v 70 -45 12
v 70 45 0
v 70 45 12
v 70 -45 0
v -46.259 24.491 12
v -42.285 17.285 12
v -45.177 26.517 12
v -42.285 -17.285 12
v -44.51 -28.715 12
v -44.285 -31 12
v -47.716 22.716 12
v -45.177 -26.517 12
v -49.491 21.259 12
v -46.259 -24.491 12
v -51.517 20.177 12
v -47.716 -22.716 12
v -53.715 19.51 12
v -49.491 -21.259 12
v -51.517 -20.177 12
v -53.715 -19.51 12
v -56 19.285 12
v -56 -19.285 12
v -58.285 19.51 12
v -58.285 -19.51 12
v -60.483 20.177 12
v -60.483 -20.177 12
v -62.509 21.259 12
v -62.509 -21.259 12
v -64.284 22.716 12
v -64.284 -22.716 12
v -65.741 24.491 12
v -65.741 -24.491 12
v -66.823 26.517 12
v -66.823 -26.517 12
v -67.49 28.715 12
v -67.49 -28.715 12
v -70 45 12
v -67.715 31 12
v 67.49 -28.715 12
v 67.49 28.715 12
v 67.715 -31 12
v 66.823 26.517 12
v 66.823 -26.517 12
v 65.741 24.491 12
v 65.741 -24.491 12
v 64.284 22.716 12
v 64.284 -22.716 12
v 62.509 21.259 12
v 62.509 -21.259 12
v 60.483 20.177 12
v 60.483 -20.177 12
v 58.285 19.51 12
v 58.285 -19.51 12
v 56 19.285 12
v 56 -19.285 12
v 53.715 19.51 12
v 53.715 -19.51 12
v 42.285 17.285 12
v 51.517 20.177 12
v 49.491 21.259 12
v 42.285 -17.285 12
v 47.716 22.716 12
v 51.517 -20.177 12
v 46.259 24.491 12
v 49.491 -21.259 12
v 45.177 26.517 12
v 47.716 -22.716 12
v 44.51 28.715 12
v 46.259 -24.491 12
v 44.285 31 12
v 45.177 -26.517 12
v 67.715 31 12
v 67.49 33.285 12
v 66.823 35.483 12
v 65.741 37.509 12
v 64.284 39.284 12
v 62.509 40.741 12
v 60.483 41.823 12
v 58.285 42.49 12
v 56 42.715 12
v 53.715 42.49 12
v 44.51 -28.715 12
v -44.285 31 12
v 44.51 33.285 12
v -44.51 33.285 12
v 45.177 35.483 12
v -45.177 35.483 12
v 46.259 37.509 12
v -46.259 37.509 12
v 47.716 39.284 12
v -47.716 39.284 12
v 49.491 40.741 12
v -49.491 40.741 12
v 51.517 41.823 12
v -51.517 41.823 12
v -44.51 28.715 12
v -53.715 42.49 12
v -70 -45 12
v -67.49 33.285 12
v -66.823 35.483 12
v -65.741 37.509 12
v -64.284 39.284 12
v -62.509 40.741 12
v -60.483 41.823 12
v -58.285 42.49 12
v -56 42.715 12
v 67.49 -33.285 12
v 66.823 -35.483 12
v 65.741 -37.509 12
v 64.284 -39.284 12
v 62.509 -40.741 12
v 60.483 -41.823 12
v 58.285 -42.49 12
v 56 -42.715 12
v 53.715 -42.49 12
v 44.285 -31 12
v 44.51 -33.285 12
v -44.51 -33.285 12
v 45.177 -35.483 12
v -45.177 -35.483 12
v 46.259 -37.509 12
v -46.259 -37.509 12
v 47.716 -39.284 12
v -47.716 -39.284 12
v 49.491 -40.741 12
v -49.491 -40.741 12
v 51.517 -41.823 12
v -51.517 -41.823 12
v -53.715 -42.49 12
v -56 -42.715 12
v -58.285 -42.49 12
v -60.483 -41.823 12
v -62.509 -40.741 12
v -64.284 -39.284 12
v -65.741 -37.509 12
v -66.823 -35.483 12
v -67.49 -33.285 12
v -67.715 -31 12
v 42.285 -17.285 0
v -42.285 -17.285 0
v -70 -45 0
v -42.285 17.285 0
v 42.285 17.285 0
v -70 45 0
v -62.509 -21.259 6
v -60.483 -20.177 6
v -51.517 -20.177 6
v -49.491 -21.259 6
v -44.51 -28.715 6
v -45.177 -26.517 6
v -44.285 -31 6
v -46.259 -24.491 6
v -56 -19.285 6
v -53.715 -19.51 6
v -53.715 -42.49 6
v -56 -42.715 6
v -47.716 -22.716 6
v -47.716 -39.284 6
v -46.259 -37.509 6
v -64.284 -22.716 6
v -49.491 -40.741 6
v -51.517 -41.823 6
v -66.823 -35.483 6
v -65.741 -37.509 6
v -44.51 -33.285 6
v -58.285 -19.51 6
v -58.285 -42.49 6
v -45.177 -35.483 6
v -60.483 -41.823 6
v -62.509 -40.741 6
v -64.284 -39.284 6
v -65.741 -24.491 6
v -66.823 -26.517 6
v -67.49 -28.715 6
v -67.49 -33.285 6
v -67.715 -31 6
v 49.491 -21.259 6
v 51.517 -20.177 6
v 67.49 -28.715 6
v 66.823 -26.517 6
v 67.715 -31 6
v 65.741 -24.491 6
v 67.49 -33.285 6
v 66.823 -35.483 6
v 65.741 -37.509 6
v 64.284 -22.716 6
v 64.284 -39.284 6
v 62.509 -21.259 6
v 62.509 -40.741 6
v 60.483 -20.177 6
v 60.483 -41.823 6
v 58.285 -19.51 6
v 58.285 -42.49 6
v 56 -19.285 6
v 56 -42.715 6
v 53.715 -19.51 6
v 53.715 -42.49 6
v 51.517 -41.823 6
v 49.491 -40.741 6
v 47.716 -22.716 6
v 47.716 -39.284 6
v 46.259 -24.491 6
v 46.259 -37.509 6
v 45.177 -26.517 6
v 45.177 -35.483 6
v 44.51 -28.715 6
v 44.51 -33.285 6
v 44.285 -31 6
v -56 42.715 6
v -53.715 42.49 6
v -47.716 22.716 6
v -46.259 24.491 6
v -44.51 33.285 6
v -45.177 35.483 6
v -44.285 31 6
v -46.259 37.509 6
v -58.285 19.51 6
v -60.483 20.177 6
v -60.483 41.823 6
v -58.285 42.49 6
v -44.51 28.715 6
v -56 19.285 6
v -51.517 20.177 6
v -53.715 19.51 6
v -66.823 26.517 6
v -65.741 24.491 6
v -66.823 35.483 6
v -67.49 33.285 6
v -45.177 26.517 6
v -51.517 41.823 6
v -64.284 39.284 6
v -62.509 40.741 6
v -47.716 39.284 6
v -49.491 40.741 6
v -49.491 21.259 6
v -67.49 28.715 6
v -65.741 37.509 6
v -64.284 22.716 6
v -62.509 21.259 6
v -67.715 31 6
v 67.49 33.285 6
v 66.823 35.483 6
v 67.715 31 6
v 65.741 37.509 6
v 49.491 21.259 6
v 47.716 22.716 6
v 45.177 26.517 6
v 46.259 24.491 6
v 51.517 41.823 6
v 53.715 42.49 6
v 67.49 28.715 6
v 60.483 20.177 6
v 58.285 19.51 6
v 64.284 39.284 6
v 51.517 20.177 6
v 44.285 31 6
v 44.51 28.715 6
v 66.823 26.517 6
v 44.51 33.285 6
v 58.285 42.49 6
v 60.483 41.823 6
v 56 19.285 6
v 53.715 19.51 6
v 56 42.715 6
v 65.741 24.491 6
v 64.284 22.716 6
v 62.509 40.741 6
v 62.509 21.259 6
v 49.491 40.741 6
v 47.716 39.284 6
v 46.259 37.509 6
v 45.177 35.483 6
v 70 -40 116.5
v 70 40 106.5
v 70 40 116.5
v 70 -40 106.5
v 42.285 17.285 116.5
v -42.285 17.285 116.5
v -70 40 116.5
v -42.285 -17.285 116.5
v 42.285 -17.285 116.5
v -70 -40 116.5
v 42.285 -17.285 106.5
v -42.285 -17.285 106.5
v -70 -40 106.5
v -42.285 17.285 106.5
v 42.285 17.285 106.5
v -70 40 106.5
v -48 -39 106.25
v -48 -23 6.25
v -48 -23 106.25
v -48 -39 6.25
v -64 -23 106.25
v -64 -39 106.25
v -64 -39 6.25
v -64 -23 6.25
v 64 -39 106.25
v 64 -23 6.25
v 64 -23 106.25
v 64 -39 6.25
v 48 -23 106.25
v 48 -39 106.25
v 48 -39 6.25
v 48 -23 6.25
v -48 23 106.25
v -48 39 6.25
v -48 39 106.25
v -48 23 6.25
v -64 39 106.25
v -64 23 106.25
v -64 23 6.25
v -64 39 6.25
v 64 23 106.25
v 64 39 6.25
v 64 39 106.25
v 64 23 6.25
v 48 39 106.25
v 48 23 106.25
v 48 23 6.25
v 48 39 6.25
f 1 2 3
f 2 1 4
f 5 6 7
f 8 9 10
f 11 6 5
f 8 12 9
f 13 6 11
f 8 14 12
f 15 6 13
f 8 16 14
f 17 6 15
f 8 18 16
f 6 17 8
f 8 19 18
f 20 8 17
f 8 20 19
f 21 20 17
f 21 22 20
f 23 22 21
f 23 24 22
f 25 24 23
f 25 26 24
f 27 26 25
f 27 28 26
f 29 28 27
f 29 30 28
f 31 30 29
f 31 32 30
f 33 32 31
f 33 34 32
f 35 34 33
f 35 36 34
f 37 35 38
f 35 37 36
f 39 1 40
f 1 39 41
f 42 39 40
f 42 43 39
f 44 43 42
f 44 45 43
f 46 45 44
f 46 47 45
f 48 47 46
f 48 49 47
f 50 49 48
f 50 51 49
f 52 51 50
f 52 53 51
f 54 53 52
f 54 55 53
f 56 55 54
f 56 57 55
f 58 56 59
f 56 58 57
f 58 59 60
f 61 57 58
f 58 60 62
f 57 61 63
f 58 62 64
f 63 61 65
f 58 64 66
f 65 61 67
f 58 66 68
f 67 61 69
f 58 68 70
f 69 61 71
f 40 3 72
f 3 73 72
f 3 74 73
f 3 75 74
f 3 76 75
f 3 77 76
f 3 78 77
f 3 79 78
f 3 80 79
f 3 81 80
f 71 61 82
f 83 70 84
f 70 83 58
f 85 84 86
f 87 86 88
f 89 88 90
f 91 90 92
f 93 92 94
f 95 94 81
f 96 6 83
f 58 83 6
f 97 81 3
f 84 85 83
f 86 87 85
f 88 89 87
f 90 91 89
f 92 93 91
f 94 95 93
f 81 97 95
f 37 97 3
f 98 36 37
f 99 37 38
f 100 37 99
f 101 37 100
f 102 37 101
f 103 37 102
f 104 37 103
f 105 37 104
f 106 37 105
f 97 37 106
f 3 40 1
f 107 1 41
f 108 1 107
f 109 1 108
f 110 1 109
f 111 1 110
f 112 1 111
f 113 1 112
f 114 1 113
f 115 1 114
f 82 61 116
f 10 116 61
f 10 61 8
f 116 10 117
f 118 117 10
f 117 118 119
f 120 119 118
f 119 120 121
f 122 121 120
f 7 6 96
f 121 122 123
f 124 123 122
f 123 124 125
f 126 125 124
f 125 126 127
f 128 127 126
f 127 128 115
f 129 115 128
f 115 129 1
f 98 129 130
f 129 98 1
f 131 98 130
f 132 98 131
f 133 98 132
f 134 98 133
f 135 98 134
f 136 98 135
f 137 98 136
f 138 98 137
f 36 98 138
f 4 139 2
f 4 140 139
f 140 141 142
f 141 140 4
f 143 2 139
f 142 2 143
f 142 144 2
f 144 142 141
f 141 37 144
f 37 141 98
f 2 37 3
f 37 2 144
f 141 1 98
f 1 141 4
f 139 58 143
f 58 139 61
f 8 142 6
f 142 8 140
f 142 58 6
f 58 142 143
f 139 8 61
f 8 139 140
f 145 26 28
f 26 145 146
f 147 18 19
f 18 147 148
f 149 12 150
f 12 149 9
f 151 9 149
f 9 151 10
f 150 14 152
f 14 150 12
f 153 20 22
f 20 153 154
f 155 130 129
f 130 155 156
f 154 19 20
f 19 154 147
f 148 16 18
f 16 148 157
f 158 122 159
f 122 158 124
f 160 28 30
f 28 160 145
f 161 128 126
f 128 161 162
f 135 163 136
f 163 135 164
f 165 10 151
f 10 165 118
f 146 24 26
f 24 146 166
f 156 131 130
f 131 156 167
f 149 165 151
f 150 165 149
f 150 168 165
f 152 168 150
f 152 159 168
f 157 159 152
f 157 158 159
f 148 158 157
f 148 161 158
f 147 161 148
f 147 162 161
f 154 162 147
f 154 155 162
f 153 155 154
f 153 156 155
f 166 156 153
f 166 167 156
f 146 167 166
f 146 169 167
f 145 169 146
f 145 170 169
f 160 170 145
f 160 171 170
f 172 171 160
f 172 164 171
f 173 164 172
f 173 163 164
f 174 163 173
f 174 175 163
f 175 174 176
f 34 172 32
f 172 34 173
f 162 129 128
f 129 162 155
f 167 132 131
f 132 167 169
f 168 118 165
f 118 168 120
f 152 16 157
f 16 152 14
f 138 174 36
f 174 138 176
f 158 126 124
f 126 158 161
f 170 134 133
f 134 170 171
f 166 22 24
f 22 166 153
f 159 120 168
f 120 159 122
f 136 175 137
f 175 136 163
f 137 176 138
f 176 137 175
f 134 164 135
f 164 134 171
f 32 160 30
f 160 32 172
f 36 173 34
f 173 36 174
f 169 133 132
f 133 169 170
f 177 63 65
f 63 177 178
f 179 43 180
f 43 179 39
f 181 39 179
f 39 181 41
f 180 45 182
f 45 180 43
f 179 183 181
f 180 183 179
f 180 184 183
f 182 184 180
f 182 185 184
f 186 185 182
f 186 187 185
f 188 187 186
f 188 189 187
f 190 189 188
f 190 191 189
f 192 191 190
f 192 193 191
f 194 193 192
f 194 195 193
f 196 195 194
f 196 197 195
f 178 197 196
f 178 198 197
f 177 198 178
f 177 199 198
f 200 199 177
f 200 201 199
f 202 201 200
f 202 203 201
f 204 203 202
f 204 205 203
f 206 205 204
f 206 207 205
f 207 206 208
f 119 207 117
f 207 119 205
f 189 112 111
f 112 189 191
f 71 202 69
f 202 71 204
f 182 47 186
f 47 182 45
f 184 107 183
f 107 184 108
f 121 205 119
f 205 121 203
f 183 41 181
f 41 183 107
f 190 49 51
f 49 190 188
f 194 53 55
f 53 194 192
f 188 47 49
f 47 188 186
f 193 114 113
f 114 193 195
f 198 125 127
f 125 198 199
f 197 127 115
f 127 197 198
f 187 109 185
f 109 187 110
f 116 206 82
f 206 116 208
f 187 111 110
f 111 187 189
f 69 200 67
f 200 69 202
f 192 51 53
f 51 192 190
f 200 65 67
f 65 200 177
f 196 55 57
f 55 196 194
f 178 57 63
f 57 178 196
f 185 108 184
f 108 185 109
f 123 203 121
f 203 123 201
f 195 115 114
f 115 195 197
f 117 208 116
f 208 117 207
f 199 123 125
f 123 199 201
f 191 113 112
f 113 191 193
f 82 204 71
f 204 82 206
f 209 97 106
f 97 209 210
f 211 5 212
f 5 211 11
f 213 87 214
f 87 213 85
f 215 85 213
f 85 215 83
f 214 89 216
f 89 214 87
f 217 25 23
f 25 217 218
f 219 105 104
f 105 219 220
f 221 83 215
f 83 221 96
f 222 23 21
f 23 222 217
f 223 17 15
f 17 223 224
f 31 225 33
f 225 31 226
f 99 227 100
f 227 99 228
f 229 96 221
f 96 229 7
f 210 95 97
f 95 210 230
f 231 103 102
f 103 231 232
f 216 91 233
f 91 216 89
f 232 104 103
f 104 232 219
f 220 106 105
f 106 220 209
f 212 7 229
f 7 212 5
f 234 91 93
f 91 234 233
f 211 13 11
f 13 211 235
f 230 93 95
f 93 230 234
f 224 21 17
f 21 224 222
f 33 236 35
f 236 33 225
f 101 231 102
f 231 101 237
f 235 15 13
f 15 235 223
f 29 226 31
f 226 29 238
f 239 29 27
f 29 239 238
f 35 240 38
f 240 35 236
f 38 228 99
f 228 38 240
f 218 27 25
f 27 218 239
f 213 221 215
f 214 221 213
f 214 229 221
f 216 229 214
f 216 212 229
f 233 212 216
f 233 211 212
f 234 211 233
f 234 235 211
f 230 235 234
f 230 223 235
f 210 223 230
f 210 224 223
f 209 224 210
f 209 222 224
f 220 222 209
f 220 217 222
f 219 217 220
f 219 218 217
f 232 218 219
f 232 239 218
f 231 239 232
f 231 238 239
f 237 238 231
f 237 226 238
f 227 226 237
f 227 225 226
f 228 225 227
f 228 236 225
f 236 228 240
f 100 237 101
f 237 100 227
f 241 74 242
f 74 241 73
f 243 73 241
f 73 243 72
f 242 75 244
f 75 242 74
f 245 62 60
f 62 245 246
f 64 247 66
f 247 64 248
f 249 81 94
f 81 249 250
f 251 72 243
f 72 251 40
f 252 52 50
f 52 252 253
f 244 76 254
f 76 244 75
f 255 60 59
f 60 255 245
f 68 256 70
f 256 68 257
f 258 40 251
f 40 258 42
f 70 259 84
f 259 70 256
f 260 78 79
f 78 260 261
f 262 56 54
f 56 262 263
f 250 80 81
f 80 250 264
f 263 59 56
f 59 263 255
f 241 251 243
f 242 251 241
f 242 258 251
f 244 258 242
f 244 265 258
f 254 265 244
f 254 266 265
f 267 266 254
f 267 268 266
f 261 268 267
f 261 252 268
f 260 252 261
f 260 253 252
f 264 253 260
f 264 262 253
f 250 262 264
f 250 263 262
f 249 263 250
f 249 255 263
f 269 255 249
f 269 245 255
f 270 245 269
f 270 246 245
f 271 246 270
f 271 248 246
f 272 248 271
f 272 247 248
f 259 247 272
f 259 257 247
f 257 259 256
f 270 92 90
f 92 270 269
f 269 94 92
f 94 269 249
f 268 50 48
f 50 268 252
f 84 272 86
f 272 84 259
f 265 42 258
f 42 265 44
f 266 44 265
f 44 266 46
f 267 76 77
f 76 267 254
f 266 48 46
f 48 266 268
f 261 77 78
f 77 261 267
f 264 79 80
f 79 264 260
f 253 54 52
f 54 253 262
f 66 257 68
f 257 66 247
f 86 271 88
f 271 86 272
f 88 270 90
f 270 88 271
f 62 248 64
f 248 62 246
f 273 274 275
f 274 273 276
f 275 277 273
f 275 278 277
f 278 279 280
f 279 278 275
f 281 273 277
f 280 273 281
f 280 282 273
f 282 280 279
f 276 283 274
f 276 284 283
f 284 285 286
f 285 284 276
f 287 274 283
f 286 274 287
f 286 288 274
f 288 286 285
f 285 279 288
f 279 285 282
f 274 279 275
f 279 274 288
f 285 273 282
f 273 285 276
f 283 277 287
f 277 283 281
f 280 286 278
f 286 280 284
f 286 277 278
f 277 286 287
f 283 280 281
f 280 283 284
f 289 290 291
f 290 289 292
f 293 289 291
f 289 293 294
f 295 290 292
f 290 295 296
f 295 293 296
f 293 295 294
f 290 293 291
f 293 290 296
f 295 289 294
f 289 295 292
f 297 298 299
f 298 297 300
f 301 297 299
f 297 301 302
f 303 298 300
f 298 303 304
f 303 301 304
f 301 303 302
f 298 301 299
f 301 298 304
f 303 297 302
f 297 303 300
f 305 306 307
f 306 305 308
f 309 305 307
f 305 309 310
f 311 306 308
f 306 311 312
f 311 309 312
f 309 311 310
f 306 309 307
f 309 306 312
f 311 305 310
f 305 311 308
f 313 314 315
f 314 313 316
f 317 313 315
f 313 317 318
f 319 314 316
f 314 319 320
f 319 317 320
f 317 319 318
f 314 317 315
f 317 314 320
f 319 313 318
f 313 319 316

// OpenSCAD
$fn = 32;

// ------------------------------------------------------------------------
// Frame cube: base 140 x 90 mm, posts 100 mm tall
// Every part is its own module, assembly() places every instance.
// ------------------------------------------------------------------------

// --- part 1 ---
module base_frame() {
  difference() {
    translate([-70, -45, 0]) cube([140, 90, 12]);
    translate([-42.285, -17.285, -1]) cube([84.57, 34.57, 14]);
    translate([-56, -31, 6]) cylinder(h = 7, d = 23.43);
    translate([56, -31, 6]) cylinder(h = 7, d = 23.43);
    translate([-56, 31, 6]) cylinder(h = 7, d = 23.43);
    translate([56, 31, 6]) cylinder(h = 7, d = 23.43);
  }
}

// --- part 2 ---
module corner_post() {
  translate([-8, -8, 0]) cube([16, 16, 100]);
}

// --- part 3 ---
module top_frame() {
  difference() {
    translate([-70, -40, 0]) cube([140, 80, 10]);
    translate([-42.285, -17.285, -1]) cube([84.57, 34.57, 12]);
  }
}

// --- assembly ---
module assembly() {
  color([0.80, 0.24, 0.20]) translate([0, 0, 0]) rotate([0, 0, 0]) base_frame();
  color([0.20, 0.45, 0.75]) translate([-56, -31, 6.25]) rotate([0, 0, 0]) corner_post();
  color([0.25, 0.62, 0.32]) translate([56, -31, 6.25]) rotate([0, 0, 0]) corner_post();
  color([0.92, 0.70, 0.18]) translate([-56, 31, 6.25]) rotate([0, 0, 0]) corner_post();
  color([0.58, 0.35, 0.70]) translate([56, 31, 6.25]) rotate([0, 0, 0]) corner_post();
  color([0.16, 0.66, 0.66]) translate([0, 0, 106.5]) rotate([0, 0, 0]) top_frame();
}

assembly();
